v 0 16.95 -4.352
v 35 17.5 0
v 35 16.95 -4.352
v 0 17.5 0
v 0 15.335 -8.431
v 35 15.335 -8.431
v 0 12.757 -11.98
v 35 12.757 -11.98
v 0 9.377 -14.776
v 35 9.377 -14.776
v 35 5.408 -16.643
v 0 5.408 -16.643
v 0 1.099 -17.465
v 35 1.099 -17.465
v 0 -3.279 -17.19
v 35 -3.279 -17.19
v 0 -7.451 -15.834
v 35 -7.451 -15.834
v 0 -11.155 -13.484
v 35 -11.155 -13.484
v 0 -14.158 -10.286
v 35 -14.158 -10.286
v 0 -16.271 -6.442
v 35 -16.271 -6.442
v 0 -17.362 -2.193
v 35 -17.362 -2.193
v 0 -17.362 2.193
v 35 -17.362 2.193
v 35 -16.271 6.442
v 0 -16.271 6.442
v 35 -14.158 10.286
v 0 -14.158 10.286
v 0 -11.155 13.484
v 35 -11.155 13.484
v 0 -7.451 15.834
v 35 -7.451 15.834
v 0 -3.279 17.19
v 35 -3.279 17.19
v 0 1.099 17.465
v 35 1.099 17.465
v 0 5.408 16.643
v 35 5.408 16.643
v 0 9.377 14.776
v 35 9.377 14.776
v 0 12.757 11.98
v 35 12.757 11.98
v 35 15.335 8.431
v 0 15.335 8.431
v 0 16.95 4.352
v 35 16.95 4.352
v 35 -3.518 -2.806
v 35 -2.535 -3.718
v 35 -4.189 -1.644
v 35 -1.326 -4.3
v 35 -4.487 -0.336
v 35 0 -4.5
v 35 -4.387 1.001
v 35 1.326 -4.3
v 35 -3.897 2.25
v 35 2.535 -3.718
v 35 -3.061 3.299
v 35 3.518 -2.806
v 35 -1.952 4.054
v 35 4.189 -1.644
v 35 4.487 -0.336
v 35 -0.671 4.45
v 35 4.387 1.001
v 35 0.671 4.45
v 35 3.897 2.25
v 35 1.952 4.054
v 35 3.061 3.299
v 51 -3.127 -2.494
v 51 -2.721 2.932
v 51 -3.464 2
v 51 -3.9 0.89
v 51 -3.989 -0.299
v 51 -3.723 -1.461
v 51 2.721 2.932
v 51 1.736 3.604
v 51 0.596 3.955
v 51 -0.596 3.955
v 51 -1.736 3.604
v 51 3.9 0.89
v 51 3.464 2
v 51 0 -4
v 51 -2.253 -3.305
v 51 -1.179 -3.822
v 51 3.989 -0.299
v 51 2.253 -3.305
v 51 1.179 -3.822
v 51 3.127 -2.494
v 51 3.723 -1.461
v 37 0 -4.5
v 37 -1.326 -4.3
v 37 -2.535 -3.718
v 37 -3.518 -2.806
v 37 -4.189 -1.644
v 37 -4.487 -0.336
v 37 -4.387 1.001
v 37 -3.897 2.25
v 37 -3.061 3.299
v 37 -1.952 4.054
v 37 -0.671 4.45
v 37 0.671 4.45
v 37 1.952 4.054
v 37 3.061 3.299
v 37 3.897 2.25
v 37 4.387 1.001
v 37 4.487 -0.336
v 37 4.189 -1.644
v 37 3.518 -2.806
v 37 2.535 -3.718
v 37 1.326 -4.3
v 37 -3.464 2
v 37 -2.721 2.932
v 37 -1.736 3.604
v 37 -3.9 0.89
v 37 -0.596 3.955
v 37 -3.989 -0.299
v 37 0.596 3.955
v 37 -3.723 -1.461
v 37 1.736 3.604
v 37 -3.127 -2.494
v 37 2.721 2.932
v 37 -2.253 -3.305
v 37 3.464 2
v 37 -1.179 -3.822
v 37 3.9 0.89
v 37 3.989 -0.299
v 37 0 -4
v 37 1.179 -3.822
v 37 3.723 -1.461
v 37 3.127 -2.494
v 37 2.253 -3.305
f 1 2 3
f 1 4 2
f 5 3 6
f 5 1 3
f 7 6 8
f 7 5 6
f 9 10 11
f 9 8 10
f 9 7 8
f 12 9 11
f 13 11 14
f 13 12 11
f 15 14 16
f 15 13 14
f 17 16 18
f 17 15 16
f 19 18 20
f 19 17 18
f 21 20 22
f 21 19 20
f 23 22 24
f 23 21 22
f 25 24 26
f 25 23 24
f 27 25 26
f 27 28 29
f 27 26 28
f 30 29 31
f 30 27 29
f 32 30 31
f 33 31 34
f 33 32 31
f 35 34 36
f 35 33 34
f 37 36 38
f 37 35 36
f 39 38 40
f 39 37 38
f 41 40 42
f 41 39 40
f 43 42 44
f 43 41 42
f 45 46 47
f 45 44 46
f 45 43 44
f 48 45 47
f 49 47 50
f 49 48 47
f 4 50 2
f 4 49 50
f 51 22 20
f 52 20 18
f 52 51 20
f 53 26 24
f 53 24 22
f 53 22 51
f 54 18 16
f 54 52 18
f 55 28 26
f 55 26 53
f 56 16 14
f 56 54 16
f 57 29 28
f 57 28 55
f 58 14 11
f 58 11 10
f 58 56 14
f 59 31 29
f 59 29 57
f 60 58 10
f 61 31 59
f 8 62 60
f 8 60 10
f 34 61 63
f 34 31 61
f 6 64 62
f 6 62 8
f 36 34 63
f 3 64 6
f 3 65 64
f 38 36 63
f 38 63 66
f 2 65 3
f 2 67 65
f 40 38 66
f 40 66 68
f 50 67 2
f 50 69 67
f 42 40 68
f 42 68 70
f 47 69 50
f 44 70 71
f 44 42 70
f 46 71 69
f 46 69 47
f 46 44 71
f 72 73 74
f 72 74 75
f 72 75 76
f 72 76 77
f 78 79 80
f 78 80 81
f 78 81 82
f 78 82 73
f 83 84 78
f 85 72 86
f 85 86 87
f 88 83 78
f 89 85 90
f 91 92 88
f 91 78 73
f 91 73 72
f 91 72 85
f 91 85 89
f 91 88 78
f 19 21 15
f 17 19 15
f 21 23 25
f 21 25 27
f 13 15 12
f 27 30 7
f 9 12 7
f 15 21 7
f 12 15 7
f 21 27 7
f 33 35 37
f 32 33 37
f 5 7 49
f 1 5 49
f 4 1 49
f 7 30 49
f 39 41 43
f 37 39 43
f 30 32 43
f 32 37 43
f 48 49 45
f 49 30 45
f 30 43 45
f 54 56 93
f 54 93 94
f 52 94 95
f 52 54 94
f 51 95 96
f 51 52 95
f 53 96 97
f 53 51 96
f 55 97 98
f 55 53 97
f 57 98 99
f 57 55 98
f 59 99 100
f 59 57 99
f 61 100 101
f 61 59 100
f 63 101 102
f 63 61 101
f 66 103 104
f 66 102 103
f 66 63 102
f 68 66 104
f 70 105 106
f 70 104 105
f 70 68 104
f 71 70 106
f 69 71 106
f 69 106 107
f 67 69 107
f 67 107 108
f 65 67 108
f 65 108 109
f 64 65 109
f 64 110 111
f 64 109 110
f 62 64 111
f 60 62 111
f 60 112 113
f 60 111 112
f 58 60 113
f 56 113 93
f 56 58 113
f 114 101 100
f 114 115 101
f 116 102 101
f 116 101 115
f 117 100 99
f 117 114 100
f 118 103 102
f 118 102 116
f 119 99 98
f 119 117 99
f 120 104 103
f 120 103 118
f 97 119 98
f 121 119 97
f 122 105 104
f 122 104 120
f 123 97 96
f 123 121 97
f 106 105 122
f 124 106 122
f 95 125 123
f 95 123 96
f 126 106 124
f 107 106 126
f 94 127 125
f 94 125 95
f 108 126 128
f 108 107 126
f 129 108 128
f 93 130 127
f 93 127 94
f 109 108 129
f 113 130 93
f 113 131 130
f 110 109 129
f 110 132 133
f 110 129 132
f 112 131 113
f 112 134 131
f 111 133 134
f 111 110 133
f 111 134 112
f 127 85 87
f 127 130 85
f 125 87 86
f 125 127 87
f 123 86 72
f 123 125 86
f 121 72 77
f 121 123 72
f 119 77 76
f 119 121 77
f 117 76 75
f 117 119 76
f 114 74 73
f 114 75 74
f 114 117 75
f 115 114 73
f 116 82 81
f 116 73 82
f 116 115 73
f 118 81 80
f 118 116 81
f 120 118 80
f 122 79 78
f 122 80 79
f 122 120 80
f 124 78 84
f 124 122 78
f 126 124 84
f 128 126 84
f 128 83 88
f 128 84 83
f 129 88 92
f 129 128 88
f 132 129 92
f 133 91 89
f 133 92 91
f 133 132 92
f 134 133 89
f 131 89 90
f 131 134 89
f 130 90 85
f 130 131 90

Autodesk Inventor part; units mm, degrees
ref_plane "YZ Plane" through (0, 0, 0) normal (1, 0, 0) x (0, 1, 0)
ref_plane "XZ Plane" through (0, 0, 0) normal (0, 1, 0) x (-1, 0, 0)
ref_plane "XY Plane" through (0, 0, 0) normal (0, 0, 1) x (1, 0, 0)
sketch "Skizze1" plane through (0, 0, 0) normal (1, 0, 0) x (0, 1, 0)
  circle A0 centre (0, 0) radius 17.5
  dimension "d0" = 35
extrude "Extrusion1" add sketch "Skizze1" along normal blind 35
sketch "Skizze2" plane through (35, 0, 0) normal (1, 0, 0) x (0, 0, -1)
  circle A0 centre (0, 0) radius 4.5
  dimension "d3" = 9
extrude "Extrusion2" add sketch "Skizze2" along normal blind 2
sketch "Skizze3" plane through (37, 0, 0) normal (1, 0, 0) x (0, 0, -1)
  circle A0 centre (0, 0) radius 4.5 projected
  circle A1 centre (0, 0) radius 4
  dimension "d6" = 8
extrude "Extrusion3" add sketch "Skizze3" along normal blind 14 contours A1
thread "Gewinde1" size "M8x1" class "6g" standard "ANSI Metric M Profile" length 80
properties part number "Spannrolle Durchmesser 30mm Breite 35mm"
